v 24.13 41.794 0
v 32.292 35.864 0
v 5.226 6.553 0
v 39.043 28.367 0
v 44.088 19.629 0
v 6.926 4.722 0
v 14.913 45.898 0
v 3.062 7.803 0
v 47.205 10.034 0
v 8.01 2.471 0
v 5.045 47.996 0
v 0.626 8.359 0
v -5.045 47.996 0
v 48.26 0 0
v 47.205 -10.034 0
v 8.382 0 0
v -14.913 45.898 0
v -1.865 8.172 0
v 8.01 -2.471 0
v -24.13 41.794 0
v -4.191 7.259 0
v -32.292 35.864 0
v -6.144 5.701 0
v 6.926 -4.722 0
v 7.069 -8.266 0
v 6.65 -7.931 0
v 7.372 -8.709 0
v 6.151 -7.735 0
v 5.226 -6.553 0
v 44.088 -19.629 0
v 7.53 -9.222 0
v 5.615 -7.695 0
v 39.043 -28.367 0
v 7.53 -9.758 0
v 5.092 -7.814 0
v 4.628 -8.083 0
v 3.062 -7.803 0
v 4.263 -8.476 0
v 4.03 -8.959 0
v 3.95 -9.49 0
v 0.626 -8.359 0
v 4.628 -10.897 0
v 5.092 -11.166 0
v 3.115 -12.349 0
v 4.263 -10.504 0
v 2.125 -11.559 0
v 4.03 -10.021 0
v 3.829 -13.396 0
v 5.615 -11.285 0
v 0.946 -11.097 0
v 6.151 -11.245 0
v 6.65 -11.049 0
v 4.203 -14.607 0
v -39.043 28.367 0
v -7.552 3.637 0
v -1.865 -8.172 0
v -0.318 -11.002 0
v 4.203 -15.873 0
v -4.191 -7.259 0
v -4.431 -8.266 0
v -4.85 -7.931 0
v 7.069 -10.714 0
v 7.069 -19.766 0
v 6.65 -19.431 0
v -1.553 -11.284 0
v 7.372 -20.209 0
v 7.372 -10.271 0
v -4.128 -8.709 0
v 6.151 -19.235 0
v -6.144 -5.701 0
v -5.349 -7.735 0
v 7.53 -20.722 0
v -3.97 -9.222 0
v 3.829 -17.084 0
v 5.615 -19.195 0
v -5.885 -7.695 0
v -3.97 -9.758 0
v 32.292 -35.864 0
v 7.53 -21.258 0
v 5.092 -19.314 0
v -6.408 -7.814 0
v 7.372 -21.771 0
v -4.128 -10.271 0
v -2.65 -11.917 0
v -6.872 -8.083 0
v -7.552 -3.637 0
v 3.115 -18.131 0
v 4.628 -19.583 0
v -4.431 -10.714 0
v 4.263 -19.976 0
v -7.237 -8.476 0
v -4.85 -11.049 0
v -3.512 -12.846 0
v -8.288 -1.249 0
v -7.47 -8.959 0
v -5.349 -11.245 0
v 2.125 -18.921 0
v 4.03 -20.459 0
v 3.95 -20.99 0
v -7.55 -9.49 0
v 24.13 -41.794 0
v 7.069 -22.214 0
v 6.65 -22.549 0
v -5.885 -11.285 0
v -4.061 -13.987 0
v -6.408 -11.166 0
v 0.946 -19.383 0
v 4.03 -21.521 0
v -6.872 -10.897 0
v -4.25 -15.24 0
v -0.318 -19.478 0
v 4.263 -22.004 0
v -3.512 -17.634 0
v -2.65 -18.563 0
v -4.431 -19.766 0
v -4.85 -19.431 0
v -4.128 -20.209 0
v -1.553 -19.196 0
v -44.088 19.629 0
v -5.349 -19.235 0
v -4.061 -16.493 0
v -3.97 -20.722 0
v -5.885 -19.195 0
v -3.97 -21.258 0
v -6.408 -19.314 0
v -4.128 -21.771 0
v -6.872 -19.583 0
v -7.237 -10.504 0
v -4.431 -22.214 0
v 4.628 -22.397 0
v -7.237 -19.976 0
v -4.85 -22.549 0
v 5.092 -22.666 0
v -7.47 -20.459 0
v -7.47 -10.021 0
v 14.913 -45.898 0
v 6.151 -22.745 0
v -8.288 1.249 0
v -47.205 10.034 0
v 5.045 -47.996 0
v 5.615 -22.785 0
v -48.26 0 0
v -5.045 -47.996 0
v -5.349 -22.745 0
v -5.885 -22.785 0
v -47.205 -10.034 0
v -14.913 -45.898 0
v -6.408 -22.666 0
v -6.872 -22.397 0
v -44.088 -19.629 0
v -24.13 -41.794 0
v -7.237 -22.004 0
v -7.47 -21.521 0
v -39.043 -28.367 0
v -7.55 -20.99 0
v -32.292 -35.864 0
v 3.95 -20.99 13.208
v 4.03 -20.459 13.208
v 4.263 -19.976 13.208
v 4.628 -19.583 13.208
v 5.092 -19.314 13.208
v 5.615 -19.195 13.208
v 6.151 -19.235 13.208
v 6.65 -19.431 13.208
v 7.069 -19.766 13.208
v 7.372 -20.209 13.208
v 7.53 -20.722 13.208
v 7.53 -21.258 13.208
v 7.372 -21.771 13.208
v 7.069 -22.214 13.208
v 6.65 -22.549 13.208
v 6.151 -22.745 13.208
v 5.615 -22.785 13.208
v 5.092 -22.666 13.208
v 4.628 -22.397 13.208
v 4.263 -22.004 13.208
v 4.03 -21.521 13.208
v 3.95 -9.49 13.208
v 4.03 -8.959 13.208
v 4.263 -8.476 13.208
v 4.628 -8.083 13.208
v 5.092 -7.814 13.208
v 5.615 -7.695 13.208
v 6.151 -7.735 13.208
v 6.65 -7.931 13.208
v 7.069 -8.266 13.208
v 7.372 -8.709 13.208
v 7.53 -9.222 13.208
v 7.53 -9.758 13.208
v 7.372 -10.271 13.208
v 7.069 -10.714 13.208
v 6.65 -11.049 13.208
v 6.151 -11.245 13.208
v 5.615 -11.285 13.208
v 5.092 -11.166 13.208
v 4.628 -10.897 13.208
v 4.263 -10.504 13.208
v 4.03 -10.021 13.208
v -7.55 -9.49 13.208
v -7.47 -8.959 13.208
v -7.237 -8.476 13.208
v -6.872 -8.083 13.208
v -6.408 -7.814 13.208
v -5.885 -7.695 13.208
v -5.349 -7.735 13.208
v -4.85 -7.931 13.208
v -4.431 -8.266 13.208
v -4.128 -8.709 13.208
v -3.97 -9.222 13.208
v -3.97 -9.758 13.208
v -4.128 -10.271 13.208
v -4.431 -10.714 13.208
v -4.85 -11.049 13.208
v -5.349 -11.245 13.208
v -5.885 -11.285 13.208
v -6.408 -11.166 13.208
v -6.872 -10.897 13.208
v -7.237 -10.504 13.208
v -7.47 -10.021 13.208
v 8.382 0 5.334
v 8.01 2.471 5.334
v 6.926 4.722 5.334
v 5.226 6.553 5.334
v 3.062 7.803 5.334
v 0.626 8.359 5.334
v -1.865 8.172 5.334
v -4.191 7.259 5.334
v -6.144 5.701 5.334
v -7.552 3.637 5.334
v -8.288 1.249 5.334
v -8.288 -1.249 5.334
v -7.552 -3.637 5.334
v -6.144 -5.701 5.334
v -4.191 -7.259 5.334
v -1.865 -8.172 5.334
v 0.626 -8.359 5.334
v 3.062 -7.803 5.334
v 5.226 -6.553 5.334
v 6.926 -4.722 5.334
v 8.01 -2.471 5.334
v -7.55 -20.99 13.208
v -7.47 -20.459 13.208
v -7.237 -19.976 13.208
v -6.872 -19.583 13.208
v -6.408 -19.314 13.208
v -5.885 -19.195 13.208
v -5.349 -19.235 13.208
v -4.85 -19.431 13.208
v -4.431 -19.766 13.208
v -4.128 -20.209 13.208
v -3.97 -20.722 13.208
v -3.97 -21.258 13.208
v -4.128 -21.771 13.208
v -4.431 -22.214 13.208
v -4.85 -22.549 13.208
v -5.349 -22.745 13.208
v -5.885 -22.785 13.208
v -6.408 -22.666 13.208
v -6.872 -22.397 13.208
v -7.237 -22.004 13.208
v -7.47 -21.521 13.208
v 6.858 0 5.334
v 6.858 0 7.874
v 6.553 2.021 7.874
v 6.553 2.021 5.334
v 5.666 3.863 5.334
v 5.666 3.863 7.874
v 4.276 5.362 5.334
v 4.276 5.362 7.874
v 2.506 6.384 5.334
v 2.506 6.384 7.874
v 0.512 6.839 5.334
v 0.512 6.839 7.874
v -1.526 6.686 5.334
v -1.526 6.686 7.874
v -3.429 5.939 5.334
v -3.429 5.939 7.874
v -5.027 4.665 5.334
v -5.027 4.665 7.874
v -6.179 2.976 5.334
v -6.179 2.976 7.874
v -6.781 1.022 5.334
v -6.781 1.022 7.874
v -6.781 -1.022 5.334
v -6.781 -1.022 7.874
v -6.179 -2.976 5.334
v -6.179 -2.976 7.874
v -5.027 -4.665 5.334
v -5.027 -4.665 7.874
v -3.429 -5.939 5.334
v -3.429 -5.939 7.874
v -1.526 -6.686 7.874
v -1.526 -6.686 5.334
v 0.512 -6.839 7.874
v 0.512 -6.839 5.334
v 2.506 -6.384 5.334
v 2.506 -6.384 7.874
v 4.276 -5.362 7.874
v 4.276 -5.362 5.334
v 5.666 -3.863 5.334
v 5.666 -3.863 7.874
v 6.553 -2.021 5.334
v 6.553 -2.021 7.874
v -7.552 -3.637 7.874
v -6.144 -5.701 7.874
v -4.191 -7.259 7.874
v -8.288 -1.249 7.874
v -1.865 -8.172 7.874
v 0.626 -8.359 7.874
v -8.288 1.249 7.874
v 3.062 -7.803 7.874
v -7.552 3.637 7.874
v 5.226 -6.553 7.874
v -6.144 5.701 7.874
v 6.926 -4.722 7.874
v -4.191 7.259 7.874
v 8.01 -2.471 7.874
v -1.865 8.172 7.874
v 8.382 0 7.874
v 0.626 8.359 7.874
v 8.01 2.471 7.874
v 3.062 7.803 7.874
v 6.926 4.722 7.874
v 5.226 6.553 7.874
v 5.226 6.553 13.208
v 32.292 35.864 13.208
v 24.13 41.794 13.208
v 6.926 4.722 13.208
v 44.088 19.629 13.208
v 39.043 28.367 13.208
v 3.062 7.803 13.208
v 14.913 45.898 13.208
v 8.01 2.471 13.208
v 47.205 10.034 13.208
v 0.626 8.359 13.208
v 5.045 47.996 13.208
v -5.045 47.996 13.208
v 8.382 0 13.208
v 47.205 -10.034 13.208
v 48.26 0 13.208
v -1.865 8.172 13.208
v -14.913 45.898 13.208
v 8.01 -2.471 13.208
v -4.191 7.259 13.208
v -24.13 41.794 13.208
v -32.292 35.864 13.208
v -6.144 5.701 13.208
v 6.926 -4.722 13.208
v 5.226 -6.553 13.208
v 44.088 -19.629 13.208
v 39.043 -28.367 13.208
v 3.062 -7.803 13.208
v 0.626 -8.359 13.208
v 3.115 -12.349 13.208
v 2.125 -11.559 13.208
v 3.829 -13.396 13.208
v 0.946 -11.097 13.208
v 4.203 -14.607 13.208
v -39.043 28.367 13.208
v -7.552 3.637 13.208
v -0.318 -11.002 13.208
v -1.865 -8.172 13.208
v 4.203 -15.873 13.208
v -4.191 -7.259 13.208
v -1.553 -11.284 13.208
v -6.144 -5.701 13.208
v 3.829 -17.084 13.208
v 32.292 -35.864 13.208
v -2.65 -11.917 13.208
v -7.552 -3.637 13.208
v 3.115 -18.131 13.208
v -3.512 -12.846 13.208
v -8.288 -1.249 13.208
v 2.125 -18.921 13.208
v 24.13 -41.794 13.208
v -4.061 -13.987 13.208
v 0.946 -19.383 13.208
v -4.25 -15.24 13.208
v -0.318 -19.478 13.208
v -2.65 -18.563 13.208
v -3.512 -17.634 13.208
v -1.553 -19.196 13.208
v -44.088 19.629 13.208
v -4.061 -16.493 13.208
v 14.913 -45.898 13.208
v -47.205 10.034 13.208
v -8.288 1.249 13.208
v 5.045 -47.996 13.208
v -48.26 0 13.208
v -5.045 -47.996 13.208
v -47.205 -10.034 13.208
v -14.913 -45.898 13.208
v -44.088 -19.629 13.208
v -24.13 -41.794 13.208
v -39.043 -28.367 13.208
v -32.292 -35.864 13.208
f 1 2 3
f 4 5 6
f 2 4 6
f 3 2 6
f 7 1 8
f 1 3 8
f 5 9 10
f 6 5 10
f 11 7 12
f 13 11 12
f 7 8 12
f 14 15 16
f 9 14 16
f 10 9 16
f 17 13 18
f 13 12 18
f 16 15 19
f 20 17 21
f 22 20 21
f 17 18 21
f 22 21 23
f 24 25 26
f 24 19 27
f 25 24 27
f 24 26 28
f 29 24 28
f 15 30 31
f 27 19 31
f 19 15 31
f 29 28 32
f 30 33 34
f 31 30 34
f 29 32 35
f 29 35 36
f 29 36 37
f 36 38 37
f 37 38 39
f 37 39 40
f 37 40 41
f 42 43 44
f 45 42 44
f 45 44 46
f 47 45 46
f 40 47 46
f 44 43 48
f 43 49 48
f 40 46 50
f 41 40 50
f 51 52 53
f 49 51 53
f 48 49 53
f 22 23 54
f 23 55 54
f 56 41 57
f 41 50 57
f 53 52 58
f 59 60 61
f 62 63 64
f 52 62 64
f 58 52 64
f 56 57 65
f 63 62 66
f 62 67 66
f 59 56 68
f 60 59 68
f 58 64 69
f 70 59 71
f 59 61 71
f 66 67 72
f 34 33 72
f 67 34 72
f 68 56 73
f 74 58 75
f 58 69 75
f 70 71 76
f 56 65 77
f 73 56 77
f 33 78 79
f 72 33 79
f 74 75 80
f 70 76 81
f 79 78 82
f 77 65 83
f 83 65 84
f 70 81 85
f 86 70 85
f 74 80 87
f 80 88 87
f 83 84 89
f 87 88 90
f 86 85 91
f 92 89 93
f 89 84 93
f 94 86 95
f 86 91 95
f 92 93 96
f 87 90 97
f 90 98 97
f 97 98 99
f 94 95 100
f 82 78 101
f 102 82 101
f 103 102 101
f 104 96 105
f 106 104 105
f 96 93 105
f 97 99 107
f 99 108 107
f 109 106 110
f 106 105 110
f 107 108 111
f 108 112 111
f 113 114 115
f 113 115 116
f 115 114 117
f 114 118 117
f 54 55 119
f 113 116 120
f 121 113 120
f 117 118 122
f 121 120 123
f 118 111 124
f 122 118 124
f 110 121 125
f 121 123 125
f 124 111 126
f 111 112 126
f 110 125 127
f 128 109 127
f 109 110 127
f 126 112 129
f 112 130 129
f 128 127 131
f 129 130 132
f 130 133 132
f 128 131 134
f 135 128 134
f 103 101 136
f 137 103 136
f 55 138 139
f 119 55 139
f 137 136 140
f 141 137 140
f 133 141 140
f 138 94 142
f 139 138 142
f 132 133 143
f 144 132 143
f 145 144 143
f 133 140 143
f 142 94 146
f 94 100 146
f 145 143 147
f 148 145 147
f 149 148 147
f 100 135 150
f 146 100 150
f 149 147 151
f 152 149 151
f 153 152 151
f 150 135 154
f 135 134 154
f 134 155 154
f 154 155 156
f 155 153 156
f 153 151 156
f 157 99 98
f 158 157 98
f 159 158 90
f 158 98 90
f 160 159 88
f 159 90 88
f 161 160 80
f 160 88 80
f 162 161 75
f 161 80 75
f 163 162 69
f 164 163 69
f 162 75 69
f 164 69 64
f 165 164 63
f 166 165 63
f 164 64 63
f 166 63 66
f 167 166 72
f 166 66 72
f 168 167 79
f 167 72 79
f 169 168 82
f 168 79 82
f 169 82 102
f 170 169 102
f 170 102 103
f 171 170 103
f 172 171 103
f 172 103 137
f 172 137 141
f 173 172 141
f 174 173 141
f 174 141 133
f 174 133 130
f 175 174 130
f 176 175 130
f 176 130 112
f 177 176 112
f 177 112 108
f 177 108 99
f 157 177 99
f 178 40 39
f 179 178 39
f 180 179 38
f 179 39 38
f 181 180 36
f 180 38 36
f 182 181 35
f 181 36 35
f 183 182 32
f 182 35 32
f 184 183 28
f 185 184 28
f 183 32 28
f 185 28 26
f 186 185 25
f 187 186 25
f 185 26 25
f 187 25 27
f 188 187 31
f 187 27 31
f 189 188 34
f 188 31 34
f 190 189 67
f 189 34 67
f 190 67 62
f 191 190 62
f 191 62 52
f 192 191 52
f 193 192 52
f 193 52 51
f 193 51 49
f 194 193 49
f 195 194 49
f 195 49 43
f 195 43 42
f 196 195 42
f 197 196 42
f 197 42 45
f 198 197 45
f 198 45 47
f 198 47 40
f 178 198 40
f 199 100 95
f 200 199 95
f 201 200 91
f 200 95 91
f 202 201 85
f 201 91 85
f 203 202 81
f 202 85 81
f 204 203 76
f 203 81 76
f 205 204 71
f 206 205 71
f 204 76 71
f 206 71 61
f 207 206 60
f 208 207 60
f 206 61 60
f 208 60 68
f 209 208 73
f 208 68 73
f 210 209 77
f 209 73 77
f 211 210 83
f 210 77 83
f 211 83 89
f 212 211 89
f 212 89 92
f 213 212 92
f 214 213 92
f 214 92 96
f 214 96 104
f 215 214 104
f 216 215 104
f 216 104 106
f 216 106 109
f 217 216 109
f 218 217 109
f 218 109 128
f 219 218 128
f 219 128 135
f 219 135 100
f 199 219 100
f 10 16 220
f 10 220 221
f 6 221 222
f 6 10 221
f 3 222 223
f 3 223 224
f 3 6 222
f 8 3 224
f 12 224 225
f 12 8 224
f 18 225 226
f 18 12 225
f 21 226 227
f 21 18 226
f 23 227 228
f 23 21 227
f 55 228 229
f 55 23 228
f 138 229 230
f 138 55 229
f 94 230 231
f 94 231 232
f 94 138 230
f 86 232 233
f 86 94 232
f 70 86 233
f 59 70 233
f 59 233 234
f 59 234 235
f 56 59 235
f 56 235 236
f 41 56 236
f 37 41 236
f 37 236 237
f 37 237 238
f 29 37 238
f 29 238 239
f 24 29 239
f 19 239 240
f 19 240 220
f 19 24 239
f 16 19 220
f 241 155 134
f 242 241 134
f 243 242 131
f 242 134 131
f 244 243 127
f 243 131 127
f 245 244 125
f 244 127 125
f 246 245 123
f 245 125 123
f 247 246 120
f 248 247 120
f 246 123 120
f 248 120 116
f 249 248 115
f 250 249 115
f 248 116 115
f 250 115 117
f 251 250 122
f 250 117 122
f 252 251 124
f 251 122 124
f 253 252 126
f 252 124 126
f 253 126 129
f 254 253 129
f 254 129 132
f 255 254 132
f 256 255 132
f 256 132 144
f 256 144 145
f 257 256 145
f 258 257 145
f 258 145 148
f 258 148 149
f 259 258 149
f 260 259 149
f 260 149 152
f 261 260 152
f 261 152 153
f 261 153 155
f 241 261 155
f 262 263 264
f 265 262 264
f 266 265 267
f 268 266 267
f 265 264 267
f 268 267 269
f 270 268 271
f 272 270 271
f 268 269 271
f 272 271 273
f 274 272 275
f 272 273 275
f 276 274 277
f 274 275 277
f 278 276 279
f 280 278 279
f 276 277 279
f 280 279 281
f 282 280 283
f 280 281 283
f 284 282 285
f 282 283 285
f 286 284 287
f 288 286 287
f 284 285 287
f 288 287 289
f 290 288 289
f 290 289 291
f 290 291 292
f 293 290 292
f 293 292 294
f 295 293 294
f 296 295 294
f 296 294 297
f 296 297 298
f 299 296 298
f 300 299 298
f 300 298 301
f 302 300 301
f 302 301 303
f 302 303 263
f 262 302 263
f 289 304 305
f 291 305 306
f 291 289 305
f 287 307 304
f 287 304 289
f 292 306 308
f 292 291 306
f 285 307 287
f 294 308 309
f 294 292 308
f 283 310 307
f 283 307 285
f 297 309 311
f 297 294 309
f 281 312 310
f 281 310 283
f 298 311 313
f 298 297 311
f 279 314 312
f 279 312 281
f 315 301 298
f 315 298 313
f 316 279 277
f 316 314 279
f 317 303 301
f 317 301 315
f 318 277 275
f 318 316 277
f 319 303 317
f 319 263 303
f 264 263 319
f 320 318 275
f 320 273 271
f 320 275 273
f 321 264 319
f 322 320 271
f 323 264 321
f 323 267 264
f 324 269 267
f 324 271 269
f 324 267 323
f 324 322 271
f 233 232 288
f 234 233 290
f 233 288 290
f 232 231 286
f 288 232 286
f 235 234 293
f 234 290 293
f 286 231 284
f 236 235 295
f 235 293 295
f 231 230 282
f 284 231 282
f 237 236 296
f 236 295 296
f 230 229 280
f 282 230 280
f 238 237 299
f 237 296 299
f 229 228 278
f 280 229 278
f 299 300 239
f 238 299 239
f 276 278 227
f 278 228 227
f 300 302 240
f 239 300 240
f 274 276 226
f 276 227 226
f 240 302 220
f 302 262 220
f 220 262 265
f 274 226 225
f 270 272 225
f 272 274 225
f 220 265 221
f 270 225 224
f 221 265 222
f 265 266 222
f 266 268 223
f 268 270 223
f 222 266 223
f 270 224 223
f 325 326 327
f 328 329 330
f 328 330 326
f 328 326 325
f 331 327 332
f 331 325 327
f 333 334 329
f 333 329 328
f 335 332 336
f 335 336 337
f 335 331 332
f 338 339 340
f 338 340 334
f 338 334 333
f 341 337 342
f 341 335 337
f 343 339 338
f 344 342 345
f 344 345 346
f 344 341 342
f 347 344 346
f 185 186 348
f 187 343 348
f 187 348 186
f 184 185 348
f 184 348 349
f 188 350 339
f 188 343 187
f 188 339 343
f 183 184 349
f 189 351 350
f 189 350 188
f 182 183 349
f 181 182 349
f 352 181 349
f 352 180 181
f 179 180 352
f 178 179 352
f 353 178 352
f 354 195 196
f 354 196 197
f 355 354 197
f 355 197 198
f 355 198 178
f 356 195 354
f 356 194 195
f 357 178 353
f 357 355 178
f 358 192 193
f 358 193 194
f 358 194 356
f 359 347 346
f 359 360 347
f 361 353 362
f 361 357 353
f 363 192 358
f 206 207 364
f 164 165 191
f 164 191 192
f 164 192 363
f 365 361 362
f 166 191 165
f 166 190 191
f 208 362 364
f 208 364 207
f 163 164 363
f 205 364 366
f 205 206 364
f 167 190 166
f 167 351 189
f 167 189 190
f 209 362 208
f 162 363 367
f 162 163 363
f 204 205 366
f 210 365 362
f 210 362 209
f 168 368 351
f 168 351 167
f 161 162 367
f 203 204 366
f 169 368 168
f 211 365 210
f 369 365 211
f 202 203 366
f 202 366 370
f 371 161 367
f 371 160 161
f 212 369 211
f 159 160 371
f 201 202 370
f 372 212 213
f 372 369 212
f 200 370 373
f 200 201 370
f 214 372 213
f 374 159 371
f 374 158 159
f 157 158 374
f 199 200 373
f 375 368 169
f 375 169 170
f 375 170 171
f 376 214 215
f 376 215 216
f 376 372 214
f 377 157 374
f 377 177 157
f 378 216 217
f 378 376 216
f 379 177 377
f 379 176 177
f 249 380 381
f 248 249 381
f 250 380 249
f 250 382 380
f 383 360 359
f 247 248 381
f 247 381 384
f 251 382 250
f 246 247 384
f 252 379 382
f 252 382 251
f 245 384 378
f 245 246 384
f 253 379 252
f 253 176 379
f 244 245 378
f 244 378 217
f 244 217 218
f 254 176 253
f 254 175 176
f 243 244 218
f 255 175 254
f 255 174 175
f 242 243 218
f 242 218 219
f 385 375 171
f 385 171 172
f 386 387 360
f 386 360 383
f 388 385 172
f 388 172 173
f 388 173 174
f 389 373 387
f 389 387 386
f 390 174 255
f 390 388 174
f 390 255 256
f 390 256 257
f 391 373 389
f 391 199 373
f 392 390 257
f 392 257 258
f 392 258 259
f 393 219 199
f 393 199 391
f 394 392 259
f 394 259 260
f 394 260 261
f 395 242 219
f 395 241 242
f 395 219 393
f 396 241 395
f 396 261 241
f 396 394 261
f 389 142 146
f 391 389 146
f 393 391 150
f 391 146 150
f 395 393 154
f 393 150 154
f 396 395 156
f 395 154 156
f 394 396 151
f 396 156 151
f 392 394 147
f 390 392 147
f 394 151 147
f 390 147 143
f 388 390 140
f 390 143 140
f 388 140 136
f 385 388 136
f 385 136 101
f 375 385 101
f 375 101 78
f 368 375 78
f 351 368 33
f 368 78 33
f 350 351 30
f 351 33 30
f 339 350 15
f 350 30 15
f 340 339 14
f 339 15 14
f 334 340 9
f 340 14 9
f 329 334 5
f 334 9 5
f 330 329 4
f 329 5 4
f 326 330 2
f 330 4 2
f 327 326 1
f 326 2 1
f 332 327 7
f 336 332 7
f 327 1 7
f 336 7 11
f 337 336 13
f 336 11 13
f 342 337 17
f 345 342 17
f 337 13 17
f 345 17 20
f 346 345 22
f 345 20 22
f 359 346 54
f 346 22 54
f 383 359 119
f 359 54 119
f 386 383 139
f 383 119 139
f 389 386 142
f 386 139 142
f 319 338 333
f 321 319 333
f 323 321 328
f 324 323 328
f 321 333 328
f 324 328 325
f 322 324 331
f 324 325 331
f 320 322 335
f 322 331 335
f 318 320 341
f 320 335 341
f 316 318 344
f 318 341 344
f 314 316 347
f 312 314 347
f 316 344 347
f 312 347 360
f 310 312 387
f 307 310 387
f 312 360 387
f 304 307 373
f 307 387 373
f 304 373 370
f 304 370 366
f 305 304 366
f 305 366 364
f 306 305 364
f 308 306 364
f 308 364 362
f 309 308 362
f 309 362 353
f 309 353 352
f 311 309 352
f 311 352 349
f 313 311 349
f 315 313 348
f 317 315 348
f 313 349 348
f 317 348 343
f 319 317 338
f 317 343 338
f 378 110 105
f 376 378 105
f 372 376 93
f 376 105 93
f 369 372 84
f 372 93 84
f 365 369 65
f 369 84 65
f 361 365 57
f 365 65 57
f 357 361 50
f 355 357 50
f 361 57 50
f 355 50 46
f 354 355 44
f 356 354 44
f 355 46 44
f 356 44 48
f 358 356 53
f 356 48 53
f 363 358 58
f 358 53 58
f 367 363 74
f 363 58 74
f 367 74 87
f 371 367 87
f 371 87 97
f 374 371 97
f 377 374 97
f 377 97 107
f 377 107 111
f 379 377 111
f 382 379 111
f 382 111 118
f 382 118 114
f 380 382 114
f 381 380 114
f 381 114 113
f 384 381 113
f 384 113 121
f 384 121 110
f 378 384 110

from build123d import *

# Parameters (mm, degrees)
SKETCH1_R           = 48.26
BOSS_EXTRUDE1_DEPTH = 13.208
SKETCH2_R           = 8.382
CUT_EXTRUDE1_DEPTH  = 5.334
SKETCH12_R          = 4.25
CUT_EXTRUDE5_DEPTH  = 70.516231659
SKETCH13_R          = 1.8
CUT_EXTRUDE7_DEPTH  = 70.516231659
SKETCH14_R          = 6.858
CUT_EXTRUDE8_DEPTH  = 70.516231659


with BuildPart() as part:
    # Sketch1 → Boss-Extrude1 (new body)
    with BuildSketch(Plane.XY):
        with Locations(Location((0, 0, 0), (0, 0, 180))):
            Circle(SKETCH1_R)
    extrude(amount=BOSS_EXTRUDE1_DEPTH)

    # Sketch2 → Cut-Extrude1 (cut)
    with BuildSketch(Plane.XY.offset(13.208)):
        Circle(SKETCH2_R)
    cut_extrude1 = extrude(amount=-CUT_EXTRUDE1_DEPTH, mode=Mode.SUBTRACT)

    # Sketch12 → Cut-Extrude5 (cut, through all)
    with BuildSketch(Plane(origin=(0, 0, 0), x_dir=(-1, 0, 0), z_dir=(0, 0, -1))):
        with Locations((0, -15.24)):
            Circle(SKETCH12_R)
    extrude(amount=-CUT_EXTRUDE5_DEPTH, mode=Mode.SUBTRACT)

    # Sketch13 → Cut-Extrude7 (cut, through all)
    with BuildSketch(Plane(origin=(0, 0, 0), x_dir=(-1, 0, 0), z_dir=(0, 0, -1))):
        with Locations((5.75, -9.49)):
            Circle(SKETCH13_R)
        with Locations((5.75, -20.99)):
            Circle(SKETCH13_R)
        with Locations((-5.75, -20.99)):
            Circle(SKETCH13_R)
        with Locations((-5.75, -9.49)):
            Circle(SKETCH13_R)
    extrude(amount=-CUT_EXTRUDE7_DEPTH, mode=Mode.SUBTRACT)

    # Mirror1: Cut-Extrude1 across plane
    add(cut_extrude1.mirror(Plane.XY.offset(6.604)), mode=Mode.SUBTRACT)

    # Sketch14 → Cut-Extrude8 (cut, through all)
    with BuildSketch(Plane.XY.offset(13.208)):
        Circle(SKETCH14_R)
    extrude(amount=-CUT_EXTRUDE8_DEPTH, mode=Mode.SUBTRACT)


solid = part.part
